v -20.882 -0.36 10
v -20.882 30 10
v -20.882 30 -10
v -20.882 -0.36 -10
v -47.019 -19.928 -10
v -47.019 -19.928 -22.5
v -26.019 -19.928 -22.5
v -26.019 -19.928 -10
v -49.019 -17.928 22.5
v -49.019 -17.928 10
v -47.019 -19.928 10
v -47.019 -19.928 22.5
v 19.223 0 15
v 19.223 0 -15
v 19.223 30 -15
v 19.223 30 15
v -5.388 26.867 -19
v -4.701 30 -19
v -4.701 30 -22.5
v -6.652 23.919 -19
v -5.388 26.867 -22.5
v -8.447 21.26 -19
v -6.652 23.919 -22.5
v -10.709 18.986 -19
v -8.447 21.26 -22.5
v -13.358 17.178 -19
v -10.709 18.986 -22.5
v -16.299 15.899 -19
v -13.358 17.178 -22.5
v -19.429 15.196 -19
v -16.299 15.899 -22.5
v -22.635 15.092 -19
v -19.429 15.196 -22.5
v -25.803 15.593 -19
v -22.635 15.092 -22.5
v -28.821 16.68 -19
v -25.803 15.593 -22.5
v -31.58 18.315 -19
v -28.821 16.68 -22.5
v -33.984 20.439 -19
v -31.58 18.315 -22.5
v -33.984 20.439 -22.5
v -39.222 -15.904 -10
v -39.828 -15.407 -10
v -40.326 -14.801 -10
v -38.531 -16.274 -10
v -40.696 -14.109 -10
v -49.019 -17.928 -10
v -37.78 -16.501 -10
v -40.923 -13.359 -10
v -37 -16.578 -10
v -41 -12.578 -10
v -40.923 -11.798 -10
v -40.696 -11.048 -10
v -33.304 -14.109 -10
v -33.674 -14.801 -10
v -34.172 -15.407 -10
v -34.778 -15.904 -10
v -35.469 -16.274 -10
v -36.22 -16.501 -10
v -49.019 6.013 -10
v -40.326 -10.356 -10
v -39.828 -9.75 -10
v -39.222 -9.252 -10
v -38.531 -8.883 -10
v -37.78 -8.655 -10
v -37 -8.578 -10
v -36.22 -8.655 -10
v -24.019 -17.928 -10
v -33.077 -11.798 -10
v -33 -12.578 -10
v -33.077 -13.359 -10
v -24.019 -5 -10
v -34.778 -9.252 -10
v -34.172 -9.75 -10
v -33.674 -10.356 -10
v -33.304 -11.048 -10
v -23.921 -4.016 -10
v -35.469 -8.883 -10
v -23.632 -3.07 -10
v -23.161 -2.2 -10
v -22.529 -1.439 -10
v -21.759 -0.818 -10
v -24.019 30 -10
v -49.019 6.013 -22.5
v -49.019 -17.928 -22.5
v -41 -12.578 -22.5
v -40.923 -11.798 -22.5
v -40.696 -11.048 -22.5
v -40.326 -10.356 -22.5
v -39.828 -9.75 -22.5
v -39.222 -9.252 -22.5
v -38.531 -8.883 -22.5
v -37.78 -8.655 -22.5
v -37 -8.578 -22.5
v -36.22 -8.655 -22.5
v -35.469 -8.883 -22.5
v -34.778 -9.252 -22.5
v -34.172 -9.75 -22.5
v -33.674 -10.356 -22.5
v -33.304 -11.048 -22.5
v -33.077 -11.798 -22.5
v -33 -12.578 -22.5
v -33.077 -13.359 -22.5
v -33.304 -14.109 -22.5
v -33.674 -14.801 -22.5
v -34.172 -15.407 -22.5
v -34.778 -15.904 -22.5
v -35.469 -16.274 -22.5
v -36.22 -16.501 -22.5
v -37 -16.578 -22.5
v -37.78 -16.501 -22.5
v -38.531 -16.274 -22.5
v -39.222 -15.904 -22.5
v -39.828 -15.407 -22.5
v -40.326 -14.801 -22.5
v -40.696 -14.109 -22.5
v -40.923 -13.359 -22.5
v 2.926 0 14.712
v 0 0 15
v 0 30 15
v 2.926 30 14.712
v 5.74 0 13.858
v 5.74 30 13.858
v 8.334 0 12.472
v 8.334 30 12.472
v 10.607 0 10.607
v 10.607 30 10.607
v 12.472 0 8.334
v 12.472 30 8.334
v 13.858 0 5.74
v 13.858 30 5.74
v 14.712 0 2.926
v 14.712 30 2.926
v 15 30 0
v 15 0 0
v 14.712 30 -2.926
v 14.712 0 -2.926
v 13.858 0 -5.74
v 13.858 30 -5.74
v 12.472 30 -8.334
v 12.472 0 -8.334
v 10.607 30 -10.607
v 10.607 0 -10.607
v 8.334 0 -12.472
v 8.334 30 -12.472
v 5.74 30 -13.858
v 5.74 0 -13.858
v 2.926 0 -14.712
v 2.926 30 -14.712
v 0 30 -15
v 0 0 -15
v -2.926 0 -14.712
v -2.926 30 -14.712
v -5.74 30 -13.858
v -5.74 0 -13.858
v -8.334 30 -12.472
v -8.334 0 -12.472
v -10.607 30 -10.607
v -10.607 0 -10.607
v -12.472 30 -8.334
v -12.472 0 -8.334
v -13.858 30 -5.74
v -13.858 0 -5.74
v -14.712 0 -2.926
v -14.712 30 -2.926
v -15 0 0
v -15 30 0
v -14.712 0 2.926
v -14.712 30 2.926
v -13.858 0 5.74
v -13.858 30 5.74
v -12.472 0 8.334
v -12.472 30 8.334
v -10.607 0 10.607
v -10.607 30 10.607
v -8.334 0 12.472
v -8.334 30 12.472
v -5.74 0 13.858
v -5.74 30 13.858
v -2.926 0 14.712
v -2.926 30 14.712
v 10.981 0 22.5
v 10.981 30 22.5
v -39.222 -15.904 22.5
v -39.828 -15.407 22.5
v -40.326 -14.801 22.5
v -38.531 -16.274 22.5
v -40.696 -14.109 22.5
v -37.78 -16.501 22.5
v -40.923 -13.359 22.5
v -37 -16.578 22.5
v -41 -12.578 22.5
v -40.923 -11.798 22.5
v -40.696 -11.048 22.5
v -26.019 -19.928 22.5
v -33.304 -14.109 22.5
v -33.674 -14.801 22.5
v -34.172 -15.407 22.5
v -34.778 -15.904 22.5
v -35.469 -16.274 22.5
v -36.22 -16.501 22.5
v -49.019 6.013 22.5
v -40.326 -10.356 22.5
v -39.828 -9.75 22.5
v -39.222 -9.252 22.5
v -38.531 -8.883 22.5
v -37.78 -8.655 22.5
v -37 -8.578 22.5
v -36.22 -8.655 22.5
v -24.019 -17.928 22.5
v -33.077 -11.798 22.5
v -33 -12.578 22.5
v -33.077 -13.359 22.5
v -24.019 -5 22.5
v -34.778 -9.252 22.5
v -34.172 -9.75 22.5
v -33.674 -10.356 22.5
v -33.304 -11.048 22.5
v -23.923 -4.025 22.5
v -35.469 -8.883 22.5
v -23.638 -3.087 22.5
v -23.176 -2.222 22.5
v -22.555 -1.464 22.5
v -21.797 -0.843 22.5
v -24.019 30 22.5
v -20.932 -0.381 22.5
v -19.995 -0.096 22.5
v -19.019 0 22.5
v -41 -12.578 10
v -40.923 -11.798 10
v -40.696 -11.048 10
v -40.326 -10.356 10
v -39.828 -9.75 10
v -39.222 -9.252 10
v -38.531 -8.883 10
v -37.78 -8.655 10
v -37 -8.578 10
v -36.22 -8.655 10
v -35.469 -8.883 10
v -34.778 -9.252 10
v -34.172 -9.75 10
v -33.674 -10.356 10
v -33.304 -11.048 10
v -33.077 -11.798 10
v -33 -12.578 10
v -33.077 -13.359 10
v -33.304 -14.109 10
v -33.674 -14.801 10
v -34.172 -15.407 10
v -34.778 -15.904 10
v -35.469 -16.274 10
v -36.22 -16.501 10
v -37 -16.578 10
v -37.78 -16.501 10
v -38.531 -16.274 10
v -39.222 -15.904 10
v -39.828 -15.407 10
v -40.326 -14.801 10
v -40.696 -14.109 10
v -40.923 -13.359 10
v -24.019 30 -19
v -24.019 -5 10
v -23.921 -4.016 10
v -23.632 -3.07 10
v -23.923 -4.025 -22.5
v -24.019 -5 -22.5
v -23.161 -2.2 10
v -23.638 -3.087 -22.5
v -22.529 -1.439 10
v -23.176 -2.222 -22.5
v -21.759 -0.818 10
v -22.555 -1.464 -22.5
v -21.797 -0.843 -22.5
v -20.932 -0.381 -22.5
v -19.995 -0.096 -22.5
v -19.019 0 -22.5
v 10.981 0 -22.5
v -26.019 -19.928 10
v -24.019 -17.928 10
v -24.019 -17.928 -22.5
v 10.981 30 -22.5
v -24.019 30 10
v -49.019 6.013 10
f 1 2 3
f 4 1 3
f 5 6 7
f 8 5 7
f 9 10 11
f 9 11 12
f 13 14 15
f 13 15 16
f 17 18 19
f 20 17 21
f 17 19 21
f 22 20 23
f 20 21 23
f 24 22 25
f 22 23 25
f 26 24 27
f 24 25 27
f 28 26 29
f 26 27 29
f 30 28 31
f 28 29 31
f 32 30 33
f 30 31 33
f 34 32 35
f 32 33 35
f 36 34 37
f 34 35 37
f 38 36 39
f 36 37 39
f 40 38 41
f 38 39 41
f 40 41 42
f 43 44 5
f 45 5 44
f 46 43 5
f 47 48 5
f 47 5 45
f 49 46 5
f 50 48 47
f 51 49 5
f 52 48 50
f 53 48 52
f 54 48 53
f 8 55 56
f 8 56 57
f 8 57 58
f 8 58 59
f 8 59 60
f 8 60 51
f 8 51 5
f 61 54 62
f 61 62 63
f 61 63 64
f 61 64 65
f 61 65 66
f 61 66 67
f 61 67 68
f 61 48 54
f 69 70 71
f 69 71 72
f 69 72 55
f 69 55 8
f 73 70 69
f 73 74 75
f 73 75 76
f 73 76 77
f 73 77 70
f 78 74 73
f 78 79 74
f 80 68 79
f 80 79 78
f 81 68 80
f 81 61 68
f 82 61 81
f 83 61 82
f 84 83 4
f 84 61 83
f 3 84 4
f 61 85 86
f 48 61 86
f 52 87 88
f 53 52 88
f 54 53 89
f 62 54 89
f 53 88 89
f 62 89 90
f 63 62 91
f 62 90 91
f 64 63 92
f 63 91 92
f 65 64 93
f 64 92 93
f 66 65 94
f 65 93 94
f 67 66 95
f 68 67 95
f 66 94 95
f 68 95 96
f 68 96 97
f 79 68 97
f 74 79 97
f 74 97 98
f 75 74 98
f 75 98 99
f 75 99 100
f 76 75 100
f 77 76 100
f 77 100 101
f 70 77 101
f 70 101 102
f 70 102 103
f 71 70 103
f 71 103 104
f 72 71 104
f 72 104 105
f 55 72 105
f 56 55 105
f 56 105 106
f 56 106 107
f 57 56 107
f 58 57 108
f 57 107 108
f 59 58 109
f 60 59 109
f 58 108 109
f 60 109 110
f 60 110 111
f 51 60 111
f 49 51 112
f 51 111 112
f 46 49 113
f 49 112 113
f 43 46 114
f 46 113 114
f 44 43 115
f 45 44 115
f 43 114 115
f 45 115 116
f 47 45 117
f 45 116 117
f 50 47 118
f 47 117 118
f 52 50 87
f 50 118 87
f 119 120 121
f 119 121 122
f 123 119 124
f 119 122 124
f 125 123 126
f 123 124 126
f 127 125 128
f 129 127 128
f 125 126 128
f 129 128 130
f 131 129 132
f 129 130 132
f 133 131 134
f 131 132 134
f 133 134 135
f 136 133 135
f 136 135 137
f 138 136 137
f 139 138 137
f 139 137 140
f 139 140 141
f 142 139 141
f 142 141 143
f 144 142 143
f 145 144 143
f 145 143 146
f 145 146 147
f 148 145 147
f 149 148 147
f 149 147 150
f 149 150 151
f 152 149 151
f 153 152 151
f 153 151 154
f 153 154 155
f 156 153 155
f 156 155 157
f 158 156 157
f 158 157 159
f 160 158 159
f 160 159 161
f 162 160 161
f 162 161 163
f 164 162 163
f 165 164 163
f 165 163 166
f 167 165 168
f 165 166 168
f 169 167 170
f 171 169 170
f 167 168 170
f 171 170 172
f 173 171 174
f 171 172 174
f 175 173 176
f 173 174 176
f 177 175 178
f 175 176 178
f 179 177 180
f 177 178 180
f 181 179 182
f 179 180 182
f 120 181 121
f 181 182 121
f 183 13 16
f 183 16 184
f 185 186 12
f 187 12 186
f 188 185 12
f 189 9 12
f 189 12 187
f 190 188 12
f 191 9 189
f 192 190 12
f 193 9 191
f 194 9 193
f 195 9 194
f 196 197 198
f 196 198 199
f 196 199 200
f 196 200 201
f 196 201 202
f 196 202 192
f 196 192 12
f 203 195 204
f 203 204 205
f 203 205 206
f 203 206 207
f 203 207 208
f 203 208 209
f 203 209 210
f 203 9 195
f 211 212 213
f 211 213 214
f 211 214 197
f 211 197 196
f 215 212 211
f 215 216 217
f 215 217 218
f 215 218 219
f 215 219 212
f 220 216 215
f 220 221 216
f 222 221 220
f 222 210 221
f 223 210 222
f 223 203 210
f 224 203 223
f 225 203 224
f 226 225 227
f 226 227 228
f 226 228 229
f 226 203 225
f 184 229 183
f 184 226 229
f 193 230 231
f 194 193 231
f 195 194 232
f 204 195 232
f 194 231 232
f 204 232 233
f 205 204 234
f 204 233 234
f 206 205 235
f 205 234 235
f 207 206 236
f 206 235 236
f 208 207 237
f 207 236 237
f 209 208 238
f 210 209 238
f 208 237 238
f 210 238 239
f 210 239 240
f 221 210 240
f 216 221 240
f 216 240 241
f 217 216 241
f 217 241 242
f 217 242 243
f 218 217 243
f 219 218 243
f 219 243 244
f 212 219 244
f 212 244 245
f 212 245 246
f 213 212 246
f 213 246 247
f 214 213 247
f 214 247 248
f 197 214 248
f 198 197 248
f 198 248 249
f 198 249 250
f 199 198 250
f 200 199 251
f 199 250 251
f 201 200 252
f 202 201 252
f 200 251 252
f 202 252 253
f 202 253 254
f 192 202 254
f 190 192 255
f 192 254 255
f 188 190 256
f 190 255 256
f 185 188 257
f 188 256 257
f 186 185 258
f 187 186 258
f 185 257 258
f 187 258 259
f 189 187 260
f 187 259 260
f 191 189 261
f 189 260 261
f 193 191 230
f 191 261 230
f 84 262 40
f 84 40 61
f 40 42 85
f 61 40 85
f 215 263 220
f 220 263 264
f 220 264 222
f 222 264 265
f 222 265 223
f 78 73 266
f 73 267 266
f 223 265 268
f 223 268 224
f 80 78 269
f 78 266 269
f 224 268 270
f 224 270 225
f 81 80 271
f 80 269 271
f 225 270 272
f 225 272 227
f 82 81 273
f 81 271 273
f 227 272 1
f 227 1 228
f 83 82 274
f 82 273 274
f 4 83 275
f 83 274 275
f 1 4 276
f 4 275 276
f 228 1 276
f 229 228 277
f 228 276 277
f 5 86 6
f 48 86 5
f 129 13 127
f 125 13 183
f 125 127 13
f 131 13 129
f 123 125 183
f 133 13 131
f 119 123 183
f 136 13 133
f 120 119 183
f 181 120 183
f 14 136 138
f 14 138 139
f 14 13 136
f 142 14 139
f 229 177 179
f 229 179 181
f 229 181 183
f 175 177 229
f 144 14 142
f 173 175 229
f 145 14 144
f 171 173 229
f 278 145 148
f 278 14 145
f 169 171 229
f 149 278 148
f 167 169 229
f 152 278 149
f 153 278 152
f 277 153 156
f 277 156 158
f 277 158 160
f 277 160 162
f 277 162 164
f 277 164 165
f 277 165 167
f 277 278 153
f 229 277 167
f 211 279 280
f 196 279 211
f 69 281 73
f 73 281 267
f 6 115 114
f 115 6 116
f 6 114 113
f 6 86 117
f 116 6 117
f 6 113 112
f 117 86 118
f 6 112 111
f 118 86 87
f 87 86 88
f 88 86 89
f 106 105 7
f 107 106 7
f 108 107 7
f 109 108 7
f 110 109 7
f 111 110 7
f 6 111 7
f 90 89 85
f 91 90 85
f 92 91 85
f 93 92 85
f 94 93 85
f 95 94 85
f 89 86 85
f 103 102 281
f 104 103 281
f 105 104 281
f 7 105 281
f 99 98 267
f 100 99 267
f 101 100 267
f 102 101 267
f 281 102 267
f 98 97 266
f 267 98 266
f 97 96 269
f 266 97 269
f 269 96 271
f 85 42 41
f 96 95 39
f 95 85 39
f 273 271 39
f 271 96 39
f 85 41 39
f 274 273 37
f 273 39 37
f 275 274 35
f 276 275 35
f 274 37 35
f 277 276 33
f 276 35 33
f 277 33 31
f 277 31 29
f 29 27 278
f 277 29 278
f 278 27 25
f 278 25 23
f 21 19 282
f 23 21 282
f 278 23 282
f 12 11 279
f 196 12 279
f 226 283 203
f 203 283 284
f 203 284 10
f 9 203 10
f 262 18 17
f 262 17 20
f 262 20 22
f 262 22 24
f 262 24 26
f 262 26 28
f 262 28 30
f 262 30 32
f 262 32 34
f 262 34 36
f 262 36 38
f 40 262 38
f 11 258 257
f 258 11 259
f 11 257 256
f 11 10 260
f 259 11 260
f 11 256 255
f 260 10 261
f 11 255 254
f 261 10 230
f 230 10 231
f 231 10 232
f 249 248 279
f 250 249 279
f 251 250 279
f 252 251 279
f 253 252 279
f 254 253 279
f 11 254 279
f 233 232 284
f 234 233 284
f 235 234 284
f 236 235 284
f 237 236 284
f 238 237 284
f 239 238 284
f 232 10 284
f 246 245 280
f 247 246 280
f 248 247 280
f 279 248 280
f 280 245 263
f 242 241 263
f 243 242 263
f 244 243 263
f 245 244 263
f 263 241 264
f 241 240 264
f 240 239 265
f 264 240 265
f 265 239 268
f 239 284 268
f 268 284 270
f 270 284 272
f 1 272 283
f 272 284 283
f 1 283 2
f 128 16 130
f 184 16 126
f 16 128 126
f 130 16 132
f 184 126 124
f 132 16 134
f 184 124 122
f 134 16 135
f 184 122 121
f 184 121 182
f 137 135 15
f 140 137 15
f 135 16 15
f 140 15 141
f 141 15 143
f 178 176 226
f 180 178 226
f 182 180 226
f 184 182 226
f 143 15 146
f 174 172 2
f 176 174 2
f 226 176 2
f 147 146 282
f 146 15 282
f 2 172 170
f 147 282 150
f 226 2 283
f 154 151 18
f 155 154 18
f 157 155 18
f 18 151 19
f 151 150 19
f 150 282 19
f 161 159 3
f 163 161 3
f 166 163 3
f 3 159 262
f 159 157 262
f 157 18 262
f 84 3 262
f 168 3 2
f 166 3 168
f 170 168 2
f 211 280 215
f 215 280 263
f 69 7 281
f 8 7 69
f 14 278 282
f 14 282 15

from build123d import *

# Parameters (mm, degrees)
EXTRUDE_1_DEPTH       = 30
SKETCH_2_R            = 15
CUT_EXTRUDE_2_DEPTH   = 45.532745299
EXTRUDE_3_DEPTH       = 45
CUT_EXTRUDE_START     = 70
SKETCH_3_W            = 44.656689001
SKETCH_3_H            = 20
CUT_EXTRUDE_1_DEPTH   = 130
SKETCH_7_R            = 3.999999997
CUT_EXTRUDE_2_2_DEPTH = 73.992250074
FILLET_1_R            = 5
CHAMFER_5_SIZE        = 2
SKETCH_10_R           = 17
CUT_EXTRUDE_5_DEPTH   = 3.5


with BuildPart() as part:
    # Эскиз1 → Вытянуть1 (new body)
    with BuildSketch(Plane(origin=(0, 0, 0), x_dir=(1, 0, 0), z_dir=(0, 1, 0))):
        Polygon((-24.019063342, 22.5), (10.980936658, 22.5), (19.22346273, 15), (19.22346273, -15), (10.980936658, -22.5), (-24.019063342, -22.5), align=None)
    extrude(amount=EXTRUDE_1_DEPTH)

    # Эскиз2 → Cut-Extrude 2 (cut, through all)
    with BuildSketch(Plane(origin=(0, 30, 0), x_dir=(1, 0, 0), z_dir=(0, 1, 0))):
        with Locations(Location((0, 0, 0), (0, 0, 270))):
            Circle(SKETCH_2_R)
    extrude(amount=-CUT_EXTRUDE_2_DEPTH, mode=Mode.SUBTRACT)

    # Эскиз6 → Вытянуть3 (add)
    with BuildSketch(Plane(origin=(0, 0, -22.5), x_dir=(-1, 0, 0), z_dir=(0, 0, -1))):
        Polygon((24.019063342, -19.927530698), (24.019063342, 30), (49.019063342, 6.012561534), (49.019063342, -19.927530698), align=None)
    extrude(amount=-EXTRUDE_3_DEPTH)

    # Эскиз3 → Вырез-Вытянуть1 (cut)
    with BuildSketch(Plane(origin=(0, 30, 0), x_dir=(1, 0, 0), z_dir=(0, 1, 0)).offset(CUT_EXTRUDE_START)):
        with Locations((-43.210774099, 0)):
            Rectangle(SKETCH_3_W, SKETCH_3_H)
    extrude(amount=-CUT_EXTRUDE_1_DEPTH, mode=Mode.SUBTRACT)

    # Эскиз7 → Cut-Extrude 2 2 (cut, through all)
    with BuildSketch(Plane(origin=(0, 0, -22.5), x_dir=(-1, 0, 0), z_dir=(0, 0, -1))):
        with Locations((37.000000002, -12.578306382)):
            Circle(SKETCH_7_R)
    extrude(amount=-CUT_EXTRUDE_2_2_DEPTH, mode=Mode.SUBTRACT)

    # Скругление1
    fillet_1_edges = [part.edges().sort_by_distance(p)[0] for p in [
        (-24.019063342, 0, -16.25),
    ]]
    fillet(fillet_1_edges, radius=FILLET_1_R)

    # Фаска5
    chamfer_5_edges = [part.edges().sort_by_distance(p)[0] for p in [
        (-49.019063342, -19.927530698, 16.25),
        (-24.019063342, -19.927530698, 16.25),
        (-24.019063342, -19.927530698, -16.25),
        (-49.019063342, -19.927530698, -16.25),
    ]]
    chamfer(chamfer_5_edges, length=CHAMFER_5_SIZE)

    # Эскиз10 → Вырез-Вытянуть5 (cut)
    with BuildSketch(Plane(origin=(0, 0, -22.5), x_dir=(-1, 0, 0), z_dir=(0, 0, -1))):
        with Locations((21.57600878, 32.059441466)):
            Circle(SKETCH_10_R)
    extrude(amount=-CUT_EXTRUDE_5_DEPTH, mode=Mode.SUBTRACT)


solid = part.part
